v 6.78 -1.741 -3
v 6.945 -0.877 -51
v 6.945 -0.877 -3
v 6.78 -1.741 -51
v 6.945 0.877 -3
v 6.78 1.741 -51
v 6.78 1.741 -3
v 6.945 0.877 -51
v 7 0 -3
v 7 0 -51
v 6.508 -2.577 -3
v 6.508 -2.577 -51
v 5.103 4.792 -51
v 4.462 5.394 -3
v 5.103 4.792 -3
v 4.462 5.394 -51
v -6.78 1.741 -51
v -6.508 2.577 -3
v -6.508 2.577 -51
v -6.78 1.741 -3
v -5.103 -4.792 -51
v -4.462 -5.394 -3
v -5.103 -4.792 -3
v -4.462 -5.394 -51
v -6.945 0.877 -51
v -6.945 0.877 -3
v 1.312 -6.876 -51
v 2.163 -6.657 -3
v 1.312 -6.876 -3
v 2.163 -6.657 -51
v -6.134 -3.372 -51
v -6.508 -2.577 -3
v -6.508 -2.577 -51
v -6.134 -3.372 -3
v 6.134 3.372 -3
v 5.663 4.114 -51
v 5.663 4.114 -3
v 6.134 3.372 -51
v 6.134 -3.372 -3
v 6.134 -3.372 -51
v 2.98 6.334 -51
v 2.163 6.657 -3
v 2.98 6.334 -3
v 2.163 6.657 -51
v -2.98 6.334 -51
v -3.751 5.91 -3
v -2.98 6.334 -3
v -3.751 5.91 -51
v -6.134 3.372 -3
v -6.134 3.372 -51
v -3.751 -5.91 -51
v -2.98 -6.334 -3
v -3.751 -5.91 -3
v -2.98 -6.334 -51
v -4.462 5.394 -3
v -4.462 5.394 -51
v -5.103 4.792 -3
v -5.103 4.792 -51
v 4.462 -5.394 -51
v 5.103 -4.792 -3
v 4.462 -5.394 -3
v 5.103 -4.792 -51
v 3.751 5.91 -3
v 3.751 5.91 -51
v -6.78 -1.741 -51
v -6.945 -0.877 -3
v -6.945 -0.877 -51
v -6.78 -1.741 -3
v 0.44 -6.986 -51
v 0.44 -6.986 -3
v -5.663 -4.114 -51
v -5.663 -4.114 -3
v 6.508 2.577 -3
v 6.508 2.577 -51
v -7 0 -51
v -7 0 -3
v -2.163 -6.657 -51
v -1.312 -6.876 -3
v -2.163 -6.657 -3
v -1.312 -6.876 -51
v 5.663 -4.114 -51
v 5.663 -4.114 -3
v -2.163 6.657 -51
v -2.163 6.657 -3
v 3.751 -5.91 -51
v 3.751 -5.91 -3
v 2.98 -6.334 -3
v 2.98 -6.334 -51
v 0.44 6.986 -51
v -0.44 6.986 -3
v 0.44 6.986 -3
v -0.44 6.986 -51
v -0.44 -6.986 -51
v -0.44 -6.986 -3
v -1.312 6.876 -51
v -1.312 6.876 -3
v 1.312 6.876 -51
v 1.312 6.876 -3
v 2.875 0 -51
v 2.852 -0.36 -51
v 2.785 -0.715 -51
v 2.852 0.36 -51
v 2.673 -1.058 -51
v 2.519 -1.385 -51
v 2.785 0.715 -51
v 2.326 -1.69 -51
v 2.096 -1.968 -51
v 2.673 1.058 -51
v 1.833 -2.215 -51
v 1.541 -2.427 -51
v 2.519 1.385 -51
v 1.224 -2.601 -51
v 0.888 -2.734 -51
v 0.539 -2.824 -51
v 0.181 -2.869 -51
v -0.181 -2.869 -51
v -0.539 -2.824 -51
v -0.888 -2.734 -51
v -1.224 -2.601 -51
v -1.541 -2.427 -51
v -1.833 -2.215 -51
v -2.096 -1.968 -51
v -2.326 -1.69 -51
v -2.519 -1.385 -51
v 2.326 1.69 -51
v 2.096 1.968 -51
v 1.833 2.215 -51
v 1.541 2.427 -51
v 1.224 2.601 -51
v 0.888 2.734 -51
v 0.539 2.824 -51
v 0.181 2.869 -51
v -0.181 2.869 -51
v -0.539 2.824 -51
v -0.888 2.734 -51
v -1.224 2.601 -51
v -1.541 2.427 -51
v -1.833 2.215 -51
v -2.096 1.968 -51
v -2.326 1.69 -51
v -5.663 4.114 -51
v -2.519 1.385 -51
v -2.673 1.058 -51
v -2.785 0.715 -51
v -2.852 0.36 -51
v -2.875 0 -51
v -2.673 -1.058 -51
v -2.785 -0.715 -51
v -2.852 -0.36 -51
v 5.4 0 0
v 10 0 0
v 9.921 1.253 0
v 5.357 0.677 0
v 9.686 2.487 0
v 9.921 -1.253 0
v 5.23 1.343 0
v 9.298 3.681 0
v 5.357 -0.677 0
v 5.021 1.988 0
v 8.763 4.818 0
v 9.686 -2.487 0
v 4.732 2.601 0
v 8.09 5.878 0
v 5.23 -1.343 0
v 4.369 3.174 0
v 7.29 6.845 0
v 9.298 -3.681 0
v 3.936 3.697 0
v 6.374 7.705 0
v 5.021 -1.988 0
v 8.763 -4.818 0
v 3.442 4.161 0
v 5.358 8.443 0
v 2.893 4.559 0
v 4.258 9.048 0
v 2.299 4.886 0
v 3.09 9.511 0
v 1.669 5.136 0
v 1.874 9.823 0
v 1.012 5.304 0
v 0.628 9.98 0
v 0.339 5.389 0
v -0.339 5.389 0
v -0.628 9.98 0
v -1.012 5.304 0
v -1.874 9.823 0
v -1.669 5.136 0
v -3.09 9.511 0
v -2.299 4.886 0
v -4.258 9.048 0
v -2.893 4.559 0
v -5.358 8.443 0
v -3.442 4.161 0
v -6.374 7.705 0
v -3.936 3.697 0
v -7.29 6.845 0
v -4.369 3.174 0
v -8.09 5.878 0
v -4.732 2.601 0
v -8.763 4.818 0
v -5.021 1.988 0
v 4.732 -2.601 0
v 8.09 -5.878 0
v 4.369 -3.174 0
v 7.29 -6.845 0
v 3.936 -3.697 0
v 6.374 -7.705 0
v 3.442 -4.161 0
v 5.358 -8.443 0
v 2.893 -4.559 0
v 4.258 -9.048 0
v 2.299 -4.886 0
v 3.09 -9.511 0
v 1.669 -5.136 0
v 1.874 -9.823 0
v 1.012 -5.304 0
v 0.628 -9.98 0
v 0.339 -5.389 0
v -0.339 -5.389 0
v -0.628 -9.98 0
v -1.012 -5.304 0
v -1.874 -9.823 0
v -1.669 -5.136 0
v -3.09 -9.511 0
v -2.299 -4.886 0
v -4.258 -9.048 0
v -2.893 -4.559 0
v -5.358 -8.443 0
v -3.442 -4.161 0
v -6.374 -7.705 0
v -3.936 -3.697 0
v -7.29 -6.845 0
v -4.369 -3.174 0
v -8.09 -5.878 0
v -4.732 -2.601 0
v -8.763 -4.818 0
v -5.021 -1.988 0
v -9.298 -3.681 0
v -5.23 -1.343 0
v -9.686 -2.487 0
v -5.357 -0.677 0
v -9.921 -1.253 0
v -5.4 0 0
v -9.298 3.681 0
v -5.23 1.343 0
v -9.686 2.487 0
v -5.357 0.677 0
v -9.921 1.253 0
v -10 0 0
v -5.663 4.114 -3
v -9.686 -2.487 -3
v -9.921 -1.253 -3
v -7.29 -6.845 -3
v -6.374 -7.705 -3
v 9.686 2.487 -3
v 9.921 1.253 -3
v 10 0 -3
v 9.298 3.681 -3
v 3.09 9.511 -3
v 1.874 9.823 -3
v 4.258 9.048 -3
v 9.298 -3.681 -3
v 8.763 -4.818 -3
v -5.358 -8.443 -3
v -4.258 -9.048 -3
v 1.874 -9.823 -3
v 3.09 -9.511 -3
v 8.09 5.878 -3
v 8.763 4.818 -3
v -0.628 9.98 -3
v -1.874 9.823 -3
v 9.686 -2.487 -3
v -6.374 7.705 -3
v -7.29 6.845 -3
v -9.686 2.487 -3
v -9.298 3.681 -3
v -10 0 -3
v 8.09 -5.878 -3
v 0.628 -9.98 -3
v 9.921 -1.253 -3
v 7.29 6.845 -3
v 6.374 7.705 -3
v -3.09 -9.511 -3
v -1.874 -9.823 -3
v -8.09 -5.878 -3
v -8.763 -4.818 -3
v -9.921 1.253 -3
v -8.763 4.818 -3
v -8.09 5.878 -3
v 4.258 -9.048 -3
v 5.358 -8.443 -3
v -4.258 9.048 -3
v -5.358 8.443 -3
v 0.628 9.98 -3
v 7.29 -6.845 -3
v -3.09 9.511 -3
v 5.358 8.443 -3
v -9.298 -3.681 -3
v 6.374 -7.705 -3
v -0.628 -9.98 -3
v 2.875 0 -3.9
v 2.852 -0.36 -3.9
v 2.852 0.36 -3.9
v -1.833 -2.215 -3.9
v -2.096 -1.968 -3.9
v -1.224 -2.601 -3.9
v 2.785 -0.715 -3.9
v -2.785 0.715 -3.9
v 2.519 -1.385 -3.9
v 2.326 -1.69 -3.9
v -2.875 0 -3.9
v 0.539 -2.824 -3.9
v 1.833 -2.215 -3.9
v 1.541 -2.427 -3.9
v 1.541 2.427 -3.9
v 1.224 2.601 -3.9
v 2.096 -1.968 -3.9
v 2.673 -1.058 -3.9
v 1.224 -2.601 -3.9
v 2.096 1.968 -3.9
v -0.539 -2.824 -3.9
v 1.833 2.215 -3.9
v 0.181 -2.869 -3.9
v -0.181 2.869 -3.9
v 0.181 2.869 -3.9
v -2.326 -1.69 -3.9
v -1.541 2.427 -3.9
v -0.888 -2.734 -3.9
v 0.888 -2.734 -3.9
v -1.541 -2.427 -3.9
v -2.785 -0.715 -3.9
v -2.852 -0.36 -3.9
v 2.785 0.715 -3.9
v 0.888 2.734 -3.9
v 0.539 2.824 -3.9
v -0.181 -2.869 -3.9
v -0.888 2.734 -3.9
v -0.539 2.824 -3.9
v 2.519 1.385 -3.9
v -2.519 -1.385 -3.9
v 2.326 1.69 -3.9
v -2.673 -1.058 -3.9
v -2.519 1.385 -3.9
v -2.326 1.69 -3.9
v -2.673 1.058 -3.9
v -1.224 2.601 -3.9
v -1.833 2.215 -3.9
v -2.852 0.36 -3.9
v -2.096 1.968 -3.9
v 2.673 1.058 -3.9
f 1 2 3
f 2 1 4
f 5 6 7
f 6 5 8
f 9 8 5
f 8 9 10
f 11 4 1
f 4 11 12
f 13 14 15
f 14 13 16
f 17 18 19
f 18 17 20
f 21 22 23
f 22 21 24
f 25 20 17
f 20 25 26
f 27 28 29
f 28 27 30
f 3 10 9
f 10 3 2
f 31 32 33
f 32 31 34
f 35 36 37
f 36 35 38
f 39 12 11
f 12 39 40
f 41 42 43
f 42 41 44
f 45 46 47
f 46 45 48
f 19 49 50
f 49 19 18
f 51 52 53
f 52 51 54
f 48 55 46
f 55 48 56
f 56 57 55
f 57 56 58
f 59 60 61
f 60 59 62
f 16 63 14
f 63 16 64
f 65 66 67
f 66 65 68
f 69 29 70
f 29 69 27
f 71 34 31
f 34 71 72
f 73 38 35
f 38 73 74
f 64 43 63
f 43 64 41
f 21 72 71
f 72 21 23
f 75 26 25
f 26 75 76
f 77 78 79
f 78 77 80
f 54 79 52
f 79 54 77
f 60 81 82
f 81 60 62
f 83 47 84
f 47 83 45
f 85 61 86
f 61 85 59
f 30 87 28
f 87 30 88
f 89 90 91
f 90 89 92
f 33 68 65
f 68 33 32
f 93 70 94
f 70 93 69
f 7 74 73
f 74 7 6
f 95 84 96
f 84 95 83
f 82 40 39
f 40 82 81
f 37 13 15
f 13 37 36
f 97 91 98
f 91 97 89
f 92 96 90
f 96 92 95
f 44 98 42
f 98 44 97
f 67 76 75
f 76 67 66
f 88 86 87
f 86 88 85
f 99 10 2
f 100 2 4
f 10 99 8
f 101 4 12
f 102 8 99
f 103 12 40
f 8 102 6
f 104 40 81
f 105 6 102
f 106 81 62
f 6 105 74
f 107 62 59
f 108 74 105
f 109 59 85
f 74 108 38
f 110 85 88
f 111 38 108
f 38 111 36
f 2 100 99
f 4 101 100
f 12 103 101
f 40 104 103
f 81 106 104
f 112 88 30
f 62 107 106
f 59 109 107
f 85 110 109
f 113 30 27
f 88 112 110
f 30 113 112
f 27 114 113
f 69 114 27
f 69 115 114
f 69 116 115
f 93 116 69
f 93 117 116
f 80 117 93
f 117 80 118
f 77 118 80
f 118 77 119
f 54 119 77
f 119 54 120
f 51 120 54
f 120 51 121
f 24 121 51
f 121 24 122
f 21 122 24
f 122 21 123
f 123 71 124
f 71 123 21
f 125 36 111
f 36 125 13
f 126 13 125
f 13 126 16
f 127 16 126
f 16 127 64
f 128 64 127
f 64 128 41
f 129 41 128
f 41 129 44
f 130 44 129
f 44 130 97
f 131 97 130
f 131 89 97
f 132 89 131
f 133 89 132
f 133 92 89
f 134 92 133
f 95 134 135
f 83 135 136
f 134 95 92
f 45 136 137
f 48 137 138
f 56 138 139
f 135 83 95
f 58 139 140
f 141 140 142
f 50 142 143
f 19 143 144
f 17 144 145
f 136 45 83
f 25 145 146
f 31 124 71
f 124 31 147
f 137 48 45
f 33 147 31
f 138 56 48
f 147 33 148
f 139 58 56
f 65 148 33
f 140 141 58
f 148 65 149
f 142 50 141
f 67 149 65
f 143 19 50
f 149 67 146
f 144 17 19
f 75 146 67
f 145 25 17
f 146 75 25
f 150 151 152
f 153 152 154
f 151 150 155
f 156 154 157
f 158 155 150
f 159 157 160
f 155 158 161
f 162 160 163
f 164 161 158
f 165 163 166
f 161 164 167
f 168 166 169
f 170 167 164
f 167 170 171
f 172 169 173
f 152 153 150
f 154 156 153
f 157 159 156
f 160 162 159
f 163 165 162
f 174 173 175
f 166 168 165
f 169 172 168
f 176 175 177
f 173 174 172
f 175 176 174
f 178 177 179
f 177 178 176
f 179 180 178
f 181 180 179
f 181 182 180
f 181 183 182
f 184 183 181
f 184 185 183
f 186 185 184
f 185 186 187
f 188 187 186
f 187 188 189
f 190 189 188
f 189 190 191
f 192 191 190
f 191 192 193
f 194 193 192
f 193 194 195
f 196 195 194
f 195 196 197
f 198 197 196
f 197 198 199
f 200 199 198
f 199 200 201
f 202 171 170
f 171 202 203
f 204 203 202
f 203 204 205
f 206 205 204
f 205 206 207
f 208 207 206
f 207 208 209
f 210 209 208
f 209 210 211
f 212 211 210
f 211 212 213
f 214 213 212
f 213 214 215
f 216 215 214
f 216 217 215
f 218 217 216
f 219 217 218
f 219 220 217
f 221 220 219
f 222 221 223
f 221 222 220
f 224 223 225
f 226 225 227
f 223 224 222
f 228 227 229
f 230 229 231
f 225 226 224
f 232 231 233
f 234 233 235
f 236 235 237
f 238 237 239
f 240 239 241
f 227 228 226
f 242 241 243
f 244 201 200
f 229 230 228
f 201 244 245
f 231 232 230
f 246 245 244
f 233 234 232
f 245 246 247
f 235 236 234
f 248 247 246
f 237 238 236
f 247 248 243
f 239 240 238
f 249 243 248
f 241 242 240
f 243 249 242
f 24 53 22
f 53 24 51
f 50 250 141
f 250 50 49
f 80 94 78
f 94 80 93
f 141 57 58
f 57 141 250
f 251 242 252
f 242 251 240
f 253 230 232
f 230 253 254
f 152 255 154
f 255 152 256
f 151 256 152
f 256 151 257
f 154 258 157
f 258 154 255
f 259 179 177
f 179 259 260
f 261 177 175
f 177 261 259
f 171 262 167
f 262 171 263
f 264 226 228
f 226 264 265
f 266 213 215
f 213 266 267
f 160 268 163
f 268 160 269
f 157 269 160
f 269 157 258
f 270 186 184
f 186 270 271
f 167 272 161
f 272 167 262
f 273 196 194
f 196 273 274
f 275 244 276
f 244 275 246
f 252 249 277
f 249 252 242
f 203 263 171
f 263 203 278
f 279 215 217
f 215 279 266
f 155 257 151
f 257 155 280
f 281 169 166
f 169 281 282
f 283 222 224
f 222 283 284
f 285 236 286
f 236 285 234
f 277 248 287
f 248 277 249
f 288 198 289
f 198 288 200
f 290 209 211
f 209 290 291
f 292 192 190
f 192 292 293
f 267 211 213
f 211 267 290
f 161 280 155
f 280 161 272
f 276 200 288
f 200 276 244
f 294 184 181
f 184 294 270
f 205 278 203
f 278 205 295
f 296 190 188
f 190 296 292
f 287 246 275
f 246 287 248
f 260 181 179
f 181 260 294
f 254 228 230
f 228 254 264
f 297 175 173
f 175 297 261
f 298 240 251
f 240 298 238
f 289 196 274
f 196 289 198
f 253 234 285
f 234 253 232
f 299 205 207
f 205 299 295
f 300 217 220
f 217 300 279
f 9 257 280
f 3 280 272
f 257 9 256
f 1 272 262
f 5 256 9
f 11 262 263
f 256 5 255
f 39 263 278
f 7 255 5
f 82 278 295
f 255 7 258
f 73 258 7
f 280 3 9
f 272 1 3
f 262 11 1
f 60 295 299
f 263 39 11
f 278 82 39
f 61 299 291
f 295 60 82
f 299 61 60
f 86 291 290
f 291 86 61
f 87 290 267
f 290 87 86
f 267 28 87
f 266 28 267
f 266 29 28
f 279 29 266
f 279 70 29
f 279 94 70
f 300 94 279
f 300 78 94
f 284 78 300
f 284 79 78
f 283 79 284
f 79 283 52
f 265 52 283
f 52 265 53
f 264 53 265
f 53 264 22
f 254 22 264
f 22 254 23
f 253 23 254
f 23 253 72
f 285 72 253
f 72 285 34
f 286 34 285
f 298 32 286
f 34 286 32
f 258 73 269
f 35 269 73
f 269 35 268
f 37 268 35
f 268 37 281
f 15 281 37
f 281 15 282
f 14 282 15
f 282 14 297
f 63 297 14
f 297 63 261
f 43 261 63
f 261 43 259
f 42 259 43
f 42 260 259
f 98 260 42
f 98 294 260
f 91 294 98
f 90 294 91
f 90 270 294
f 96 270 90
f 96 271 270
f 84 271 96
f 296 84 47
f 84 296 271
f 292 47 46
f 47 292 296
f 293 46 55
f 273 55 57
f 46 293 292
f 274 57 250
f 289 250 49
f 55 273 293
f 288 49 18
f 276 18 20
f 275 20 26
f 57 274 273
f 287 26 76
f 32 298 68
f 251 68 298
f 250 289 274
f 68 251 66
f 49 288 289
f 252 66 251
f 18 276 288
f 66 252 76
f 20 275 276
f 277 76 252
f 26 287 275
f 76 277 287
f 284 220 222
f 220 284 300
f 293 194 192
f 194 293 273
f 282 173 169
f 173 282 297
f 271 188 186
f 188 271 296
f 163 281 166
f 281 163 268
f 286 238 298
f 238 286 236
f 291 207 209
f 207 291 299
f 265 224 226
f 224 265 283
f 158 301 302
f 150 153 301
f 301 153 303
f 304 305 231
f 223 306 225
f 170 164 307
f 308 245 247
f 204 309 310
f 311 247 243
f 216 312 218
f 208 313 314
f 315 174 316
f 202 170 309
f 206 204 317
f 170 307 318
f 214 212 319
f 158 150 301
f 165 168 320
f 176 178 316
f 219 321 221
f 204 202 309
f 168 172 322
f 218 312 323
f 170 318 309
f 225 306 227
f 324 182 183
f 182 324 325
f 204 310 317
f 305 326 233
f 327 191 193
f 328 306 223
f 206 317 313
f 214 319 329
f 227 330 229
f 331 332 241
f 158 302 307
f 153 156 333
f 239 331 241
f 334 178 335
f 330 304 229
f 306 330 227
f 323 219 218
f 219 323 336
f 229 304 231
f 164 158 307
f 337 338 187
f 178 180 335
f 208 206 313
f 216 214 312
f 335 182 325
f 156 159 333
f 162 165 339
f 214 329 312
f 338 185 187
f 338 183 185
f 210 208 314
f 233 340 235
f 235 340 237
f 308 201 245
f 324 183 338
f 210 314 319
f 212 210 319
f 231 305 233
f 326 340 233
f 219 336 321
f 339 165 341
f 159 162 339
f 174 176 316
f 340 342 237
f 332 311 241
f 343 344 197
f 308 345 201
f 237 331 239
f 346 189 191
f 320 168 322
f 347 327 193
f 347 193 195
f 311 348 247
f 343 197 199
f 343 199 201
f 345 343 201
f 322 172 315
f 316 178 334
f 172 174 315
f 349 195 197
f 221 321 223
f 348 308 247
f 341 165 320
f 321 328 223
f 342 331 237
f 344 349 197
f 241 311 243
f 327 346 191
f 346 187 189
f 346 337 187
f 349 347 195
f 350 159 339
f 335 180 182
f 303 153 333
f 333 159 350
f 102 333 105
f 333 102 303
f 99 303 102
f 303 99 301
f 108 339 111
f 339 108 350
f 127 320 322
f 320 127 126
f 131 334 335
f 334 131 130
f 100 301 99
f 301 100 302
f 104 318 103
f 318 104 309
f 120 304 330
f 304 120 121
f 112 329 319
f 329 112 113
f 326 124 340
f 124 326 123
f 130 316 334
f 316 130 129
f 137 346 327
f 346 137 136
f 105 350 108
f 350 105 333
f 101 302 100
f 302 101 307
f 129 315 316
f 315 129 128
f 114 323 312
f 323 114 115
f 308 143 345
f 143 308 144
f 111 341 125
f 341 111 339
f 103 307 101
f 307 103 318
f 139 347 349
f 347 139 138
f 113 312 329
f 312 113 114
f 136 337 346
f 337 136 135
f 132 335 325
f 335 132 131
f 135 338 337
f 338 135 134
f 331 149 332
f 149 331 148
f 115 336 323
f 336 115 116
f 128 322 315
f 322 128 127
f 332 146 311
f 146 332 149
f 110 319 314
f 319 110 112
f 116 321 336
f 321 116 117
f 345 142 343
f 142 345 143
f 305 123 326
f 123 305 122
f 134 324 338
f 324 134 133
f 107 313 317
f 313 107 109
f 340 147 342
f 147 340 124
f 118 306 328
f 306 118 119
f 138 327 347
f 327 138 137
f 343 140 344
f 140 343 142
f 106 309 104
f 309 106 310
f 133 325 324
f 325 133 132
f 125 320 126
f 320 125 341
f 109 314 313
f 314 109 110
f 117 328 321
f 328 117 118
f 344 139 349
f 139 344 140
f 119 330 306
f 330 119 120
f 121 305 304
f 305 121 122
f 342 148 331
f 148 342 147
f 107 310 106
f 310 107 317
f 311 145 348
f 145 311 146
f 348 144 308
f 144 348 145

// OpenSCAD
$fn = 50;


difference() {
	union() {
		translate(v = [0, 0, -51.0000000000]) {
			cylinder(h = 51, r = 7.0000000000);
		}
		translate(v = [0, 0, -3.0000000000]) {
			cylinder(h = 3, r = 10.0000000000);
		}
	}
	union() {
		translate(v = [0, 0, 0]) {
			rotate(a = [0, 0, 0]) {
				difference() {
					union() {
						#translate(v = [0, 0, -51.0000000000]) {
							cylinder(h = 51, r = 2.6000000000);
						}
						#translate(v = [0, 0, -3.9000000000]) {
							cylinder(h = 3.9000000000, r1 = 2.8750000000, r2 = 5.4000000000);
						}
						#translate(v = [0, 0, -51.0000000000]) {
							cylinder(h = 51, r = 2.8750000000);
						}
						#translate(v = [0, 0, -51.0000000000]) {
							cylinder(h = 51, r = 2.6000000000);
						}
					}
					union();
				}
			}
		}
	}
}
